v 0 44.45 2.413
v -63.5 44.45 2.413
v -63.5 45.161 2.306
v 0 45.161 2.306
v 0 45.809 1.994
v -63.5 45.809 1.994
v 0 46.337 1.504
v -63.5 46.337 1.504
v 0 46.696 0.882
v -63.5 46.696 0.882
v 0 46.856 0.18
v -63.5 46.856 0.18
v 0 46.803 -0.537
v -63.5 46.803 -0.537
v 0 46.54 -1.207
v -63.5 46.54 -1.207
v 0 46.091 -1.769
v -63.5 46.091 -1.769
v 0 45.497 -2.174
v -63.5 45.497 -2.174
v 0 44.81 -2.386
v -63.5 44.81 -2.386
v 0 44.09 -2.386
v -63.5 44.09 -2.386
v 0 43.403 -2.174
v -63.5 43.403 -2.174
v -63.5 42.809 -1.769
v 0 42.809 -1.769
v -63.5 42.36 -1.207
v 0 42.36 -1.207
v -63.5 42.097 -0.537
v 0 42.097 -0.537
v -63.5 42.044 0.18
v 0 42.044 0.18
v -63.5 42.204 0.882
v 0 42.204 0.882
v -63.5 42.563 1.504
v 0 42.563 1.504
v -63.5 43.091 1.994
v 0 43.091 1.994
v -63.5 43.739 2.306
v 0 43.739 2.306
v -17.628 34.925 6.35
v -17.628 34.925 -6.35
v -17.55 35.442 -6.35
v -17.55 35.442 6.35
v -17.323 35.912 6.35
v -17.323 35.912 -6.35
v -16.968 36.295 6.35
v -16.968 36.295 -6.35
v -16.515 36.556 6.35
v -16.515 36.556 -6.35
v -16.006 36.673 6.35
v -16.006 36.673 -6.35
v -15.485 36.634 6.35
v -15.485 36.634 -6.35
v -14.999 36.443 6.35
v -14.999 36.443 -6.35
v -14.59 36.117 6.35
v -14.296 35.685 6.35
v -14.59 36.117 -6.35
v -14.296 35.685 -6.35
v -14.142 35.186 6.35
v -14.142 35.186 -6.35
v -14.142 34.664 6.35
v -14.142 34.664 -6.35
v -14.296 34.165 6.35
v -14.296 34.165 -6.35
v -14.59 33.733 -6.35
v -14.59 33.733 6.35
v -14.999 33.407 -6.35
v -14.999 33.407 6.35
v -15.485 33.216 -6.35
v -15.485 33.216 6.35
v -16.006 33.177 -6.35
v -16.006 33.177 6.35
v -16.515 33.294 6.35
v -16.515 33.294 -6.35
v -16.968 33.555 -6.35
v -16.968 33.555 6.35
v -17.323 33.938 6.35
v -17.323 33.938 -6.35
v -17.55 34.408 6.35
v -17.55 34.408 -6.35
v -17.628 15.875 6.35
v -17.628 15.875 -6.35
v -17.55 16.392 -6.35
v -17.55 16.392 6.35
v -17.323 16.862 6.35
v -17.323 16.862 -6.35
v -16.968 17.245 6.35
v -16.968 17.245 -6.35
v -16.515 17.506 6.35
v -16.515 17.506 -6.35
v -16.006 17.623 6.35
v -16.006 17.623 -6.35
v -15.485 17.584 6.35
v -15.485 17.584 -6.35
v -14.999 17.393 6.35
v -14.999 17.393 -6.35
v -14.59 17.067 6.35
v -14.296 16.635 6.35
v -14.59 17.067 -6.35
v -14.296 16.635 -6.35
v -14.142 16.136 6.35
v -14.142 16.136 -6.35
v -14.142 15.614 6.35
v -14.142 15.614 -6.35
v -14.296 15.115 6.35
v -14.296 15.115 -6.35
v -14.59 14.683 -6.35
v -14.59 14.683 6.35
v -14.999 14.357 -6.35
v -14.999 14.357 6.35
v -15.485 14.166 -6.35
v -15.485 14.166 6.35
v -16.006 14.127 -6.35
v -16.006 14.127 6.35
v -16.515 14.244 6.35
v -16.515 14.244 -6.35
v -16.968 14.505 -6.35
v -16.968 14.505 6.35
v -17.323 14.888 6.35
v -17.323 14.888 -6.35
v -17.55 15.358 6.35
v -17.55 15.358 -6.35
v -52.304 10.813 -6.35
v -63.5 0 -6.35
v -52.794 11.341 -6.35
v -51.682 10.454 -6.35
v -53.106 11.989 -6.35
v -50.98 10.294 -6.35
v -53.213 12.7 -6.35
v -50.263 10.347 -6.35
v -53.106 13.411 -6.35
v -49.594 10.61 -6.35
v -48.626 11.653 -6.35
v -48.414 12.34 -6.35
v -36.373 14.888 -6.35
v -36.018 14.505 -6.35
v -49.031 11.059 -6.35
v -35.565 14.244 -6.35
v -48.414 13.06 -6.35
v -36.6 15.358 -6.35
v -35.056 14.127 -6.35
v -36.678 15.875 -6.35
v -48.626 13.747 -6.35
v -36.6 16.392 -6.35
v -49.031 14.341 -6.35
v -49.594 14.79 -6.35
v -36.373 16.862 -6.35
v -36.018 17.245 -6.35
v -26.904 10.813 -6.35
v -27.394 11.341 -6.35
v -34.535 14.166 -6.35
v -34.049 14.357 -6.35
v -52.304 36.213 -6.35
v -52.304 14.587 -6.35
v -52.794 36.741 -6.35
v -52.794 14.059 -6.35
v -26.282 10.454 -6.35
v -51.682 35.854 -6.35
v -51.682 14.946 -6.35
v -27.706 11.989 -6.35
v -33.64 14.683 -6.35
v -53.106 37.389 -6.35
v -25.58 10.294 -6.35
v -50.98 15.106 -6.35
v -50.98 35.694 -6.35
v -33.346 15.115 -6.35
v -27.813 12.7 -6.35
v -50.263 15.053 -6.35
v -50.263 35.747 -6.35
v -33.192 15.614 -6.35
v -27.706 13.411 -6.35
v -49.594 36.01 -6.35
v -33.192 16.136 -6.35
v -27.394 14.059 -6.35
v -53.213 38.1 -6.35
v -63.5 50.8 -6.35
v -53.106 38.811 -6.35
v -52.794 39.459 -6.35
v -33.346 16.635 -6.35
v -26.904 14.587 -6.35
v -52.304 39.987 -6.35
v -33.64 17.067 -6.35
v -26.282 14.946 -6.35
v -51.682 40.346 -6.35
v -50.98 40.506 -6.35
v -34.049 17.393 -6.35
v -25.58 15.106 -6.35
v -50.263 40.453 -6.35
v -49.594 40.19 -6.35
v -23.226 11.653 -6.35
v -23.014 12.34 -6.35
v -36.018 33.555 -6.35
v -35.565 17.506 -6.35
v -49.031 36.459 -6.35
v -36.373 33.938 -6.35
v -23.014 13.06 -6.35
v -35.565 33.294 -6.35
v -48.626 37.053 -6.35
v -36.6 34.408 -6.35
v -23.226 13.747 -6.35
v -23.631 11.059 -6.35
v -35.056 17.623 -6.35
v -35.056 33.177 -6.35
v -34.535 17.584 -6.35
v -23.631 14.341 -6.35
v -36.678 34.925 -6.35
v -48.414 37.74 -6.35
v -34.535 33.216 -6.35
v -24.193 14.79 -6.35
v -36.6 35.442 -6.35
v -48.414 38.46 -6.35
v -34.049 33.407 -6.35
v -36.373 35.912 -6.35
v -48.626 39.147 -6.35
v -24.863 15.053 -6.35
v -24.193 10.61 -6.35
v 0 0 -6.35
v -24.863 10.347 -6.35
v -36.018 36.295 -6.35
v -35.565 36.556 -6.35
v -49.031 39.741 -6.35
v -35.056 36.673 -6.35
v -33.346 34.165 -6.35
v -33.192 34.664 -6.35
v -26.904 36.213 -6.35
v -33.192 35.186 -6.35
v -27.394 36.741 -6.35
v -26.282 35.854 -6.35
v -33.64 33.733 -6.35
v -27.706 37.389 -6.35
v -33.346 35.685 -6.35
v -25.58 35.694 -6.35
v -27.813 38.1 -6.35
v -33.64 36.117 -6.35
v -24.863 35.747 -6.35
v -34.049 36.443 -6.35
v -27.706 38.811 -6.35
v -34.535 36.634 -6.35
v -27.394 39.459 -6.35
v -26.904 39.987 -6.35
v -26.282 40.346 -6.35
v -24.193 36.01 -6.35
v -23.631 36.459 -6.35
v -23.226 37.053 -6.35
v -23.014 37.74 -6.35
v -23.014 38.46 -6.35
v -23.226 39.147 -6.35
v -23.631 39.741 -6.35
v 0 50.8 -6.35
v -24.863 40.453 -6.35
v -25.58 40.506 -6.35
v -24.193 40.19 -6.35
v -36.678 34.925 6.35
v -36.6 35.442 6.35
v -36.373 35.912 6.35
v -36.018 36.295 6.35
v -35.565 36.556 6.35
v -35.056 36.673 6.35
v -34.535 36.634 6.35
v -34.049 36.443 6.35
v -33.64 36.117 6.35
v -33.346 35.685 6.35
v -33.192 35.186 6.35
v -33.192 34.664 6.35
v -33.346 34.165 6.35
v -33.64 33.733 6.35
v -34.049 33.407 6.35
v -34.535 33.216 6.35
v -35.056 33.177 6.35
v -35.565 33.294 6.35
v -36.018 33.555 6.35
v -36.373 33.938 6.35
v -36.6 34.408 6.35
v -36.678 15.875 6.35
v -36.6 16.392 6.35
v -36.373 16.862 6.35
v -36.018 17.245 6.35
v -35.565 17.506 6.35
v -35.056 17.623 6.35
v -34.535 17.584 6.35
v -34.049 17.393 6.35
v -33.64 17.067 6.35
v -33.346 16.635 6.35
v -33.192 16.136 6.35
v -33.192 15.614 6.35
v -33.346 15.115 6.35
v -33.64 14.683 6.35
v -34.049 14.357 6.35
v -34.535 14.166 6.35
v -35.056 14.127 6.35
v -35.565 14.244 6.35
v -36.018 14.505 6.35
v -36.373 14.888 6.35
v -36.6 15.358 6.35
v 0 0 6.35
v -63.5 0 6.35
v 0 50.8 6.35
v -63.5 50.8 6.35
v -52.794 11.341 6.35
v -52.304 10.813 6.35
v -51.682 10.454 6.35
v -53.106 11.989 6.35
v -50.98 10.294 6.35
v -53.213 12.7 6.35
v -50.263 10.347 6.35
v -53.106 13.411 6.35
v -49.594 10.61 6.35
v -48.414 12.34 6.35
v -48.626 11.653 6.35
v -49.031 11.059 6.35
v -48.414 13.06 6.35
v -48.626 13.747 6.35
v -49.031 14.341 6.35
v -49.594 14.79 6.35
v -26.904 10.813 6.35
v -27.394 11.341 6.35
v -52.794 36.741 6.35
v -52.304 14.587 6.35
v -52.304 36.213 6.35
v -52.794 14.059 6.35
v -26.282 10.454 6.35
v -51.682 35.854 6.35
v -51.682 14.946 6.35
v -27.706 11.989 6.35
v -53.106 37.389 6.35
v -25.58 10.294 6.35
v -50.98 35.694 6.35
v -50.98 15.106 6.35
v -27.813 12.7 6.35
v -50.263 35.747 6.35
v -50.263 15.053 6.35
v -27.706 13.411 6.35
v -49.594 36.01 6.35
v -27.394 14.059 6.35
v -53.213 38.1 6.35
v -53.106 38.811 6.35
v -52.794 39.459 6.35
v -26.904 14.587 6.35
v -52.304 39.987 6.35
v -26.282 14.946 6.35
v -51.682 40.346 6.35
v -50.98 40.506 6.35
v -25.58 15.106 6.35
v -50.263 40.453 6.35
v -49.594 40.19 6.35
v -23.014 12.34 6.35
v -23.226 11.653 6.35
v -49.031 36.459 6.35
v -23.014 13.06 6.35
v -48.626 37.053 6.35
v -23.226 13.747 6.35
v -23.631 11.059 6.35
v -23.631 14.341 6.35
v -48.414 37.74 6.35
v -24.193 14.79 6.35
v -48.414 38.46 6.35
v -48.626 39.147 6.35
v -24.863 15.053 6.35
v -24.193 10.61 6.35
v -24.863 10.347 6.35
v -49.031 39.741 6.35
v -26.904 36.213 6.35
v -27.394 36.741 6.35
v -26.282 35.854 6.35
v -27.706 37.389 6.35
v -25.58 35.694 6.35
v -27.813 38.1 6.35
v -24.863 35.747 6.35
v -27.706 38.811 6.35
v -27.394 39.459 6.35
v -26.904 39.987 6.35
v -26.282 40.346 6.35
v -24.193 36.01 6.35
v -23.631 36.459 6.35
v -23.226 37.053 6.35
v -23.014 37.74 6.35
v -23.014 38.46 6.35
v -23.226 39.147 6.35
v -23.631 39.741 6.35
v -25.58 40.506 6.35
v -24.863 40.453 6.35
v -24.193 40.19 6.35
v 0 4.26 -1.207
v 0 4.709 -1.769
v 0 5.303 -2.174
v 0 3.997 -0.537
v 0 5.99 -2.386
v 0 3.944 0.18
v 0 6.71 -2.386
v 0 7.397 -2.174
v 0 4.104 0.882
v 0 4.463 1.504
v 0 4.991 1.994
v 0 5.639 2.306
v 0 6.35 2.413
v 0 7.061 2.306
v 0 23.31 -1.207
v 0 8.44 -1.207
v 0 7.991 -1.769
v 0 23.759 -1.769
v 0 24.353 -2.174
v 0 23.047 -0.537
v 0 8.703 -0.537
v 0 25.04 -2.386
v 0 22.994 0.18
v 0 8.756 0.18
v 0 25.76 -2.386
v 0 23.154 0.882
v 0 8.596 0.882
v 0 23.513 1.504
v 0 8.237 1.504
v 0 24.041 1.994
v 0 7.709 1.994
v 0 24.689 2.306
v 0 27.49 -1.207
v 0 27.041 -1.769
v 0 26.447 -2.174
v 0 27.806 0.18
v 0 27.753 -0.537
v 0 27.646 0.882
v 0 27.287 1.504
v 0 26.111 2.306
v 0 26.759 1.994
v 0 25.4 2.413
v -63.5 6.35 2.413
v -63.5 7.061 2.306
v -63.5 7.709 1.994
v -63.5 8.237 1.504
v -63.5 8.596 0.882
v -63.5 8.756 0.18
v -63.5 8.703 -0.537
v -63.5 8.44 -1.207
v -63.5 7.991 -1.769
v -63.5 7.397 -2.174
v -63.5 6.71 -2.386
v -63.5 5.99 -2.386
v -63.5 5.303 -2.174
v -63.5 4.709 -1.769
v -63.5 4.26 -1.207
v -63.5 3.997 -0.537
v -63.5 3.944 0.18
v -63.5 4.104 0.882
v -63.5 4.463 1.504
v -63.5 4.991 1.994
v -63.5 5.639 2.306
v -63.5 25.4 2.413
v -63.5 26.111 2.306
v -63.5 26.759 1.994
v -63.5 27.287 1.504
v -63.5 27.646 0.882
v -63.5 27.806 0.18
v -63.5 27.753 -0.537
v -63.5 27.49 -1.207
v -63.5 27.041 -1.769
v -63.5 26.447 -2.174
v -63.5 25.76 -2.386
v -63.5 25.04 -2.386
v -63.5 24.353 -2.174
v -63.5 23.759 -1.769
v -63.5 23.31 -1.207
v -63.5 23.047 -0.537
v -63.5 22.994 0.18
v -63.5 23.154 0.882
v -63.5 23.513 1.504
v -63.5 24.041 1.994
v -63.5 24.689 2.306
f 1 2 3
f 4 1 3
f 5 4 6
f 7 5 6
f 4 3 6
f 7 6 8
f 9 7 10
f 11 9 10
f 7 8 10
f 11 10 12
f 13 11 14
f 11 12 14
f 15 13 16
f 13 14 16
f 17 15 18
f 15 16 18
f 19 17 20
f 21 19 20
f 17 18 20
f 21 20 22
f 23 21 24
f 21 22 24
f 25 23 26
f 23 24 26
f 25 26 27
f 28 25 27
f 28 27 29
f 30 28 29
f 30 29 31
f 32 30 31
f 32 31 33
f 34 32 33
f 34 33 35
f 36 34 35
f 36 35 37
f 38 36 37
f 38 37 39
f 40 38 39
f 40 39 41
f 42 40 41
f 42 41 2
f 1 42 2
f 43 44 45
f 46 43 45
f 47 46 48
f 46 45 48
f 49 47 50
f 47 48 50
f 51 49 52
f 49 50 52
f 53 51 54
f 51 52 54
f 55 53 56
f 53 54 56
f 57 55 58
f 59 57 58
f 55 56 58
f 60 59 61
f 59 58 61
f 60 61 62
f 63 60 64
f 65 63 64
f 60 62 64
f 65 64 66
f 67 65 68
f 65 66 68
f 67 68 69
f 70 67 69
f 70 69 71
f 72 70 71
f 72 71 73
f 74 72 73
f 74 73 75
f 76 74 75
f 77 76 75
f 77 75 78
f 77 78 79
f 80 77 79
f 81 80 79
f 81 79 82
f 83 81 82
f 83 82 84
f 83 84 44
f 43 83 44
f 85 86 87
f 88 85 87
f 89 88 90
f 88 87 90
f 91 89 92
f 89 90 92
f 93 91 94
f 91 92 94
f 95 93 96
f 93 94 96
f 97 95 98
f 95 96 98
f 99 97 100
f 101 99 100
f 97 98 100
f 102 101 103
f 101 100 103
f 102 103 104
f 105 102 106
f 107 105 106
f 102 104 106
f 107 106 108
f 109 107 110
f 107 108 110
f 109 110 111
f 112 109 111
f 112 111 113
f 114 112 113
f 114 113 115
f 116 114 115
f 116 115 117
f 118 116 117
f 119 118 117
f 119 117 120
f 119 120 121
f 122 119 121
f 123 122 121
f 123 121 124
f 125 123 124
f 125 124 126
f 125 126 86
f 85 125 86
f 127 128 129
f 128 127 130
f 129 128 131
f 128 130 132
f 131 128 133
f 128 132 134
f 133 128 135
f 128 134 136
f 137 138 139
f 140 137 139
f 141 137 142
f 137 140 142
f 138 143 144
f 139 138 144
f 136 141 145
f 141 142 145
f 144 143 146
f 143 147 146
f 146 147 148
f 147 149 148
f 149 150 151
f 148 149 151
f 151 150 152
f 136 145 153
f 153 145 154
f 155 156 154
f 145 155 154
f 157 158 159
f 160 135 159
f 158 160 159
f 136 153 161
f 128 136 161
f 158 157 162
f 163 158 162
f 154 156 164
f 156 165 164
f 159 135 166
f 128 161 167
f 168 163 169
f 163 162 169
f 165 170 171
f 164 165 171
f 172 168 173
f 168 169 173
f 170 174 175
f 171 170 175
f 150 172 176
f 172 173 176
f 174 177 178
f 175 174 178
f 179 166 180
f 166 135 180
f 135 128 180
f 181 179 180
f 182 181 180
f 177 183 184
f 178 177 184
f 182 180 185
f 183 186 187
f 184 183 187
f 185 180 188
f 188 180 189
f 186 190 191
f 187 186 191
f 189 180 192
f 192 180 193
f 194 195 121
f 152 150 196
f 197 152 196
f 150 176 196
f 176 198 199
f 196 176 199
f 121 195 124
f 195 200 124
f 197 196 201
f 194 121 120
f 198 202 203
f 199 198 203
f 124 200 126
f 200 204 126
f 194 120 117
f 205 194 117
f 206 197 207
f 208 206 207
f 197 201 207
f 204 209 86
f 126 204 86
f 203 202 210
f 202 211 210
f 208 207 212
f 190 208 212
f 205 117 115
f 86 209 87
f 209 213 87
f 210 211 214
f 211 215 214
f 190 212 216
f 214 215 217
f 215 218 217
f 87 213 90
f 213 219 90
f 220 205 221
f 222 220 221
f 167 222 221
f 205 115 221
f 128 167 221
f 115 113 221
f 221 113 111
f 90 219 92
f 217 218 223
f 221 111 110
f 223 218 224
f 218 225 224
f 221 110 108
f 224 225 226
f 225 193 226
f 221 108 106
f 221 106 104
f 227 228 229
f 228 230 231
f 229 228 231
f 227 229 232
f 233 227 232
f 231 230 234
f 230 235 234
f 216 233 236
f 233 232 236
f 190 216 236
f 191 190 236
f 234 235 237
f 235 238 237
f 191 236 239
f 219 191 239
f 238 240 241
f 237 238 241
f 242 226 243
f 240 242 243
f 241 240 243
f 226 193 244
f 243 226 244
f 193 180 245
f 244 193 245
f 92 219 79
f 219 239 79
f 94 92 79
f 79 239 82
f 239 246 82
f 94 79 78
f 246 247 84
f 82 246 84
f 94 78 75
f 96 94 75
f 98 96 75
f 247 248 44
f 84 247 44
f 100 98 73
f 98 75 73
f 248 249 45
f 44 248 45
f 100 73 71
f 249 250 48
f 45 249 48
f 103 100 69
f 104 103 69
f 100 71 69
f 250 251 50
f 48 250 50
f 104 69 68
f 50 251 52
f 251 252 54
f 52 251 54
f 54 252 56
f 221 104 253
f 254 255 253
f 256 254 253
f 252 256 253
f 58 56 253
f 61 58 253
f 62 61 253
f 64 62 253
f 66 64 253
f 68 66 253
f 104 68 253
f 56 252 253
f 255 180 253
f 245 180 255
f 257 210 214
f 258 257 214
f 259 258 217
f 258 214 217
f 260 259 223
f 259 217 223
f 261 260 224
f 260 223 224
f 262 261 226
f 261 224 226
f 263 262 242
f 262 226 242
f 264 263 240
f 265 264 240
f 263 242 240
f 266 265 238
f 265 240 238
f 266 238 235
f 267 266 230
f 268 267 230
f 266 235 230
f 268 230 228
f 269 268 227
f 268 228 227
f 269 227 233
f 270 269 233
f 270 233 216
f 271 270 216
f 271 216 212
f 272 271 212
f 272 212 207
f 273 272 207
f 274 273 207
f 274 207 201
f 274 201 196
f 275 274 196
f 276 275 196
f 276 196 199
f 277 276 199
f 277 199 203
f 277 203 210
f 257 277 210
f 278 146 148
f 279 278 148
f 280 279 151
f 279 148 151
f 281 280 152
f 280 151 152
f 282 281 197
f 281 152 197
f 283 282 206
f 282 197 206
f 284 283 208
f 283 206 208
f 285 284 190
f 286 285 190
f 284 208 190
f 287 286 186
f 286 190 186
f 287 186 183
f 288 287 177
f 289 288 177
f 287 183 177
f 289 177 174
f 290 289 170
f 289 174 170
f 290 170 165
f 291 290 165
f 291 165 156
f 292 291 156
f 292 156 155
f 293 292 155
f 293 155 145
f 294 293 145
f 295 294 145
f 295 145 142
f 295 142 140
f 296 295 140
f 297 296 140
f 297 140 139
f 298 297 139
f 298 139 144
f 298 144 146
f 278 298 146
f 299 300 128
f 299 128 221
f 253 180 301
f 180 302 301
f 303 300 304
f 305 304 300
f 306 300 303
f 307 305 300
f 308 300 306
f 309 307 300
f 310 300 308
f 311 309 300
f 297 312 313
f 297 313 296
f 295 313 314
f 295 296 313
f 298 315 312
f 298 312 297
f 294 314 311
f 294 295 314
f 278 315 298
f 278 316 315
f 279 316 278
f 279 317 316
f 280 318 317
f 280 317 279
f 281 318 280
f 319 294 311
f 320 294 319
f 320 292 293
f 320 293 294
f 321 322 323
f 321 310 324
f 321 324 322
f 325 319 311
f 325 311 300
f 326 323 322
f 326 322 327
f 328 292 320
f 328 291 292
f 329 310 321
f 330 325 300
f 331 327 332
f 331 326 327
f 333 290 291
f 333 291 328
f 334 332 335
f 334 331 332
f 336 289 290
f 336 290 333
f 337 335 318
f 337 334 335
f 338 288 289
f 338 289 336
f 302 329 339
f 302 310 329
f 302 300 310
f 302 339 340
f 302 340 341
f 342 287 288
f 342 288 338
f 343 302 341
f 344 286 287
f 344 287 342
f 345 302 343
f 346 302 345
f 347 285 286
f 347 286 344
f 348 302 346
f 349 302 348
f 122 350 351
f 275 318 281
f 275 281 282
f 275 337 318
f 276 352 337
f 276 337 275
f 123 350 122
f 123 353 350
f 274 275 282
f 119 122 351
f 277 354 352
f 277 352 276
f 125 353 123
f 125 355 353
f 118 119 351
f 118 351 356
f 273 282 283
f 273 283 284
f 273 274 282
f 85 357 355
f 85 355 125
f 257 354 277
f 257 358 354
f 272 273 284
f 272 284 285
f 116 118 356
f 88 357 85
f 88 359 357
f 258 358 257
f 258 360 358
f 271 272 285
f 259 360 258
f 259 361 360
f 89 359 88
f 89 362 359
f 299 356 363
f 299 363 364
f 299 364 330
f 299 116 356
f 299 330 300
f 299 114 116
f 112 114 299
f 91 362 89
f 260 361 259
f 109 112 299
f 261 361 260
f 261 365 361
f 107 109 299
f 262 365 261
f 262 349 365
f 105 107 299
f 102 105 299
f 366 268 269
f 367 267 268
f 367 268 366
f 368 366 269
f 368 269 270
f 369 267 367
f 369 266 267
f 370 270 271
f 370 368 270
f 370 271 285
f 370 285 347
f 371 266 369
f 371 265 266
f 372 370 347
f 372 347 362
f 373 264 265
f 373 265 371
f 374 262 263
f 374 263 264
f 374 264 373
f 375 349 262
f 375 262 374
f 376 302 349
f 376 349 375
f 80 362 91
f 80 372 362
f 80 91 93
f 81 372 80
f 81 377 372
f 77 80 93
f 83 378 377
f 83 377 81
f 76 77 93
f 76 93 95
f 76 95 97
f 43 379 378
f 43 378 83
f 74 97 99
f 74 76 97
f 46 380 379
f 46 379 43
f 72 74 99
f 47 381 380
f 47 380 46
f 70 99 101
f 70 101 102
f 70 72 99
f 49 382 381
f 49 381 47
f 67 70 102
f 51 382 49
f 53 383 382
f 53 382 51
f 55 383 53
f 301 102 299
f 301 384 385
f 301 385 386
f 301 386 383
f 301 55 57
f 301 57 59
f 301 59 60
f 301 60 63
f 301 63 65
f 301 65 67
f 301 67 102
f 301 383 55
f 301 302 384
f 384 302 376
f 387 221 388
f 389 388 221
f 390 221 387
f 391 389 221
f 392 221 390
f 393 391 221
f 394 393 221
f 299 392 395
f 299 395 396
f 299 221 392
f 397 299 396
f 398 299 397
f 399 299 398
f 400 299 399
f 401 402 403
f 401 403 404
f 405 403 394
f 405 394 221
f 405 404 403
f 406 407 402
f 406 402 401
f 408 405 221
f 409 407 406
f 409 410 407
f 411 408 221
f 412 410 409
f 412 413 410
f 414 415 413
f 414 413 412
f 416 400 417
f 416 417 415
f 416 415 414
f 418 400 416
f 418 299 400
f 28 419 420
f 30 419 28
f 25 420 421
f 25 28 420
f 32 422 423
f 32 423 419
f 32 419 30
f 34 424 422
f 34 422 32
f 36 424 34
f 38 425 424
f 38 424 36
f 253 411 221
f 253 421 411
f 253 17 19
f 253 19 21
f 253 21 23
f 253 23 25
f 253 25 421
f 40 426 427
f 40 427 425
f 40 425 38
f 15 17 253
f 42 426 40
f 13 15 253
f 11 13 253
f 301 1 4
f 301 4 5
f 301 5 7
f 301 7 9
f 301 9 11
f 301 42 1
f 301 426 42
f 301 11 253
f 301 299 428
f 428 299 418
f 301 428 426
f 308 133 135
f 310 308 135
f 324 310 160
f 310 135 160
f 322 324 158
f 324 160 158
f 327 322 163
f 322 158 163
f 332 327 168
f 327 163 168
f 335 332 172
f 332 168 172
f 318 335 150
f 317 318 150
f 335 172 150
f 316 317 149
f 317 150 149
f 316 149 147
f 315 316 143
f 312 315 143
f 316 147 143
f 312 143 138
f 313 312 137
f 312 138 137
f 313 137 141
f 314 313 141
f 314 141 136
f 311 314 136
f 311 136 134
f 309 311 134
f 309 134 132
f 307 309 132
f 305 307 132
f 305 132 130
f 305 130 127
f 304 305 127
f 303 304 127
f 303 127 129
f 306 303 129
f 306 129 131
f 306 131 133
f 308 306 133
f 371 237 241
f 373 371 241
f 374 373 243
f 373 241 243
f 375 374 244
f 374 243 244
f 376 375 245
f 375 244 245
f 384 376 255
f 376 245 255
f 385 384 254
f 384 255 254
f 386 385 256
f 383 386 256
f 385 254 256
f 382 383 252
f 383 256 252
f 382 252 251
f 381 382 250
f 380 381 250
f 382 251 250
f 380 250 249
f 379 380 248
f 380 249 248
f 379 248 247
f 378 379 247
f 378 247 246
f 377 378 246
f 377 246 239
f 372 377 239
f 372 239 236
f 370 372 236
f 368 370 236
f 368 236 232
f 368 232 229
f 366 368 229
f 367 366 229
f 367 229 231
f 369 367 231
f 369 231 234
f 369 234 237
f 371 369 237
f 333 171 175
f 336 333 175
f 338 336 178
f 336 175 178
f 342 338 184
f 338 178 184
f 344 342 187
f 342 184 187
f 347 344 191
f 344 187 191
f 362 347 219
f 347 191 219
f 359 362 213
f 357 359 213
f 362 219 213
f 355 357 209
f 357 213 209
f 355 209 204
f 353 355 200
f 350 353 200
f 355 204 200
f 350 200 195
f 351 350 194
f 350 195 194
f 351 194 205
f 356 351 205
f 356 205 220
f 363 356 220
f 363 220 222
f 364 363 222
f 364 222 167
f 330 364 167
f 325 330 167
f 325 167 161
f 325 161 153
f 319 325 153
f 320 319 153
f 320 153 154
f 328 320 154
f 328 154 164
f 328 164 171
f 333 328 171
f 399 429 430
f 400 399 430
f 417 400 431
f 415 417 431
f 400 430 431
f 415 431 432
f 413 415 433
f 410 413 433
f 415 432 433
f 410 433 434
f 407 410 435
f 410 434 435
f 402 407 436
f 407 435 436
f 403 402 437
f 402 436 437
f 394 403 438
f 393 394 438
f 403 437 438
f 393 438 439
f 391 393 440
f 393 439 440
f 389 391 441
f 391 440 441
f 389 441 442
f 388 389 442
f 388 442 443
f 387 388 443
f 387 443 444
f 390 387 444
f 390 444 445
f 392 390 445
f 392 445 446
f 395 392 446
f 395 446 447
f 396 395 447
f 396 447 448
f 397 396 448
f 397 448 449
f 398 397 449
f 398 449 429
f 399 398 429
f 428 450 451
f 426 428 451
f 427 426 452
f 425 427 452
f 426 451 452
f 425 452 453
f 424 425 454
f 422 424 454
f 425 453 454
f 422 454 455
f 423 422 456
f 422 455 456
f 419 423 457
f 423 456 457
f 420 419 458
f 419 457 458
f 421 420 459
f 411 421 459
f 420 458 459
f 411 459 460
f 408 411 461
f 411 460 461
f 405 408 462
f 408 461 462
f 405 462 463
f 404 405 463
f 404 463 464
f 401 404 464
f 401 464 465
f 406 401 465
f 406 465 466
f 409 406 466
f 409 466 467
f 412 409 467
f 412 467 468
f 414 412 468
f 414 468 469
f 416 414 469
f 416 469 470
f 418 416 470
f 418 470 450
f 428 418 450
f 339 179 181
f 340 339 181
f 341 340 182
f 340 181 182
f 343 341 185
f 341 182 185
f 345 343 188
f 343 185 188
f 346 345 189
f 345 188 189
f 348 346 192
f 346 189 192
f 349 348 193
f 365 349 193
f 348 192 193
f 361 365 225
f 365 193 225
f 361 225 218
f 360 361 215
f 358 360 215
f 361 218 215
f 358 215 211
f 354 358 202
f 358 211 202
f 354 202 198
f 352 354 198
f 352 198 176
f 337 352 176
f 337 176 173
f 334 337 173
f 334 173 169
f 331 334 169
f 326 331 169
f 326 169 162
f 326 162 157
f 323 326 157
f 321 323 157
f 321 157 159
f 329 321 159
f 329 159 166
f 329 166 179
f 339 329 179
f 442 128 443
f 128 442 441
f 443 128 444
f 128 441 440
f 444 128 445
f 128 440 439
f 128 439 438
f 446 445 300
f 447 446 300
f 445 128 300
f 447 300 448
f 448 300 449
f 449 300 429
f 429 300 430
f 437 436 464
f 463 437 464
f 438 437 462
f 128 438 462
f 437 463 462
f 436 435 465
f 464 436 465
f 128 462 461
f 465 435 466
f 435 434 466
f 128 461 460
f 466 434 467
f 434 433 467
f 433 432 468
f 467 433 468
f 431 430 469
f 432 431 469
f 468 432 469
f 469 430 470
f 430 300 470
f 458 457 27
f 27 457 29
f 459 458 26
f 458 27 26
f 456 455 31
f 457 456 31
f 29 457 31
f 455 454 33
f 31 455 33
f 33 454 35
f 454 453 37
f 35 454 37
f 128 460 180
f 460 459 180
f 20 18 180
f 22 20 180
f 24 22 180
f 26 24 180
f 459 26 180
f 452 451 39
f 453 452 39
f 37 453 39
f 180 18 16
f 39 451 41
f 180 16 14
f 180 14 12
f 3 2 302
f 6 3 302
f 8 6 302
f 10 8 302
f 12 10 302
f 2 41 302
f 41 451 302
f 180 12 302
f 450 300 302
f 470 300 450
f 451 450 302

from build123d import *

# Parameters (mm, degrees)
SKETCH1_W                = 63.5
SKETCH1_H                = 50.8
BOSS_EXTRUDE1_DEPTH      = 6.35
F_10_32_THREADED_D       = 4.826
F_10_32_THREADED_FRONT_D = 4.826
F_6_32_THREADED_FRONT_D  = 3.5052


with BuildPart() as part:
    # Sketch1 → Boss-Extrude1 (new, symmetric)
    with BuildSketch(Plane.XY):
        with Locations((-31.75, 25.4)):
            Rectangle(SKETCH1_W, SKETCH1_H)
    extrude(amount=BOSS_EXTRUDE1_DEPTH, both=True)

    # #10-32 Threaded (through all)
    with Locations(Plane(origin=(0, 0, 0), x_dir=(0, 0, -1), z_dir=(1, 0, 0))):
        with Locations((0, 44.45), (0, 25.4), (0, 6.35)):
            Hole(F_10_32_THREADED_D / 2)

    # #10-32 Threaded Front (through all)
    with Locations(Plane.XY.offset(6.35)):
        with Locations((-50.8, 38.1), (-25.4, 38.1), (-50.8, 12.7), (-25.4, 12.7)):
            Hole(F_10_32_THREADED_FRONT_D / 2)

    # #6-32 Threaded Front (through all)
    with Locations(Plane.XY.offset(6.35)):
        with Locations((-34.925, 34.925), (-15.875, 34.925), (-15.875, 15.875), (-34.925, 15.875)):
            Hole(F_6_32_THREADED_FRONT_D / 2)


solid = part.part
